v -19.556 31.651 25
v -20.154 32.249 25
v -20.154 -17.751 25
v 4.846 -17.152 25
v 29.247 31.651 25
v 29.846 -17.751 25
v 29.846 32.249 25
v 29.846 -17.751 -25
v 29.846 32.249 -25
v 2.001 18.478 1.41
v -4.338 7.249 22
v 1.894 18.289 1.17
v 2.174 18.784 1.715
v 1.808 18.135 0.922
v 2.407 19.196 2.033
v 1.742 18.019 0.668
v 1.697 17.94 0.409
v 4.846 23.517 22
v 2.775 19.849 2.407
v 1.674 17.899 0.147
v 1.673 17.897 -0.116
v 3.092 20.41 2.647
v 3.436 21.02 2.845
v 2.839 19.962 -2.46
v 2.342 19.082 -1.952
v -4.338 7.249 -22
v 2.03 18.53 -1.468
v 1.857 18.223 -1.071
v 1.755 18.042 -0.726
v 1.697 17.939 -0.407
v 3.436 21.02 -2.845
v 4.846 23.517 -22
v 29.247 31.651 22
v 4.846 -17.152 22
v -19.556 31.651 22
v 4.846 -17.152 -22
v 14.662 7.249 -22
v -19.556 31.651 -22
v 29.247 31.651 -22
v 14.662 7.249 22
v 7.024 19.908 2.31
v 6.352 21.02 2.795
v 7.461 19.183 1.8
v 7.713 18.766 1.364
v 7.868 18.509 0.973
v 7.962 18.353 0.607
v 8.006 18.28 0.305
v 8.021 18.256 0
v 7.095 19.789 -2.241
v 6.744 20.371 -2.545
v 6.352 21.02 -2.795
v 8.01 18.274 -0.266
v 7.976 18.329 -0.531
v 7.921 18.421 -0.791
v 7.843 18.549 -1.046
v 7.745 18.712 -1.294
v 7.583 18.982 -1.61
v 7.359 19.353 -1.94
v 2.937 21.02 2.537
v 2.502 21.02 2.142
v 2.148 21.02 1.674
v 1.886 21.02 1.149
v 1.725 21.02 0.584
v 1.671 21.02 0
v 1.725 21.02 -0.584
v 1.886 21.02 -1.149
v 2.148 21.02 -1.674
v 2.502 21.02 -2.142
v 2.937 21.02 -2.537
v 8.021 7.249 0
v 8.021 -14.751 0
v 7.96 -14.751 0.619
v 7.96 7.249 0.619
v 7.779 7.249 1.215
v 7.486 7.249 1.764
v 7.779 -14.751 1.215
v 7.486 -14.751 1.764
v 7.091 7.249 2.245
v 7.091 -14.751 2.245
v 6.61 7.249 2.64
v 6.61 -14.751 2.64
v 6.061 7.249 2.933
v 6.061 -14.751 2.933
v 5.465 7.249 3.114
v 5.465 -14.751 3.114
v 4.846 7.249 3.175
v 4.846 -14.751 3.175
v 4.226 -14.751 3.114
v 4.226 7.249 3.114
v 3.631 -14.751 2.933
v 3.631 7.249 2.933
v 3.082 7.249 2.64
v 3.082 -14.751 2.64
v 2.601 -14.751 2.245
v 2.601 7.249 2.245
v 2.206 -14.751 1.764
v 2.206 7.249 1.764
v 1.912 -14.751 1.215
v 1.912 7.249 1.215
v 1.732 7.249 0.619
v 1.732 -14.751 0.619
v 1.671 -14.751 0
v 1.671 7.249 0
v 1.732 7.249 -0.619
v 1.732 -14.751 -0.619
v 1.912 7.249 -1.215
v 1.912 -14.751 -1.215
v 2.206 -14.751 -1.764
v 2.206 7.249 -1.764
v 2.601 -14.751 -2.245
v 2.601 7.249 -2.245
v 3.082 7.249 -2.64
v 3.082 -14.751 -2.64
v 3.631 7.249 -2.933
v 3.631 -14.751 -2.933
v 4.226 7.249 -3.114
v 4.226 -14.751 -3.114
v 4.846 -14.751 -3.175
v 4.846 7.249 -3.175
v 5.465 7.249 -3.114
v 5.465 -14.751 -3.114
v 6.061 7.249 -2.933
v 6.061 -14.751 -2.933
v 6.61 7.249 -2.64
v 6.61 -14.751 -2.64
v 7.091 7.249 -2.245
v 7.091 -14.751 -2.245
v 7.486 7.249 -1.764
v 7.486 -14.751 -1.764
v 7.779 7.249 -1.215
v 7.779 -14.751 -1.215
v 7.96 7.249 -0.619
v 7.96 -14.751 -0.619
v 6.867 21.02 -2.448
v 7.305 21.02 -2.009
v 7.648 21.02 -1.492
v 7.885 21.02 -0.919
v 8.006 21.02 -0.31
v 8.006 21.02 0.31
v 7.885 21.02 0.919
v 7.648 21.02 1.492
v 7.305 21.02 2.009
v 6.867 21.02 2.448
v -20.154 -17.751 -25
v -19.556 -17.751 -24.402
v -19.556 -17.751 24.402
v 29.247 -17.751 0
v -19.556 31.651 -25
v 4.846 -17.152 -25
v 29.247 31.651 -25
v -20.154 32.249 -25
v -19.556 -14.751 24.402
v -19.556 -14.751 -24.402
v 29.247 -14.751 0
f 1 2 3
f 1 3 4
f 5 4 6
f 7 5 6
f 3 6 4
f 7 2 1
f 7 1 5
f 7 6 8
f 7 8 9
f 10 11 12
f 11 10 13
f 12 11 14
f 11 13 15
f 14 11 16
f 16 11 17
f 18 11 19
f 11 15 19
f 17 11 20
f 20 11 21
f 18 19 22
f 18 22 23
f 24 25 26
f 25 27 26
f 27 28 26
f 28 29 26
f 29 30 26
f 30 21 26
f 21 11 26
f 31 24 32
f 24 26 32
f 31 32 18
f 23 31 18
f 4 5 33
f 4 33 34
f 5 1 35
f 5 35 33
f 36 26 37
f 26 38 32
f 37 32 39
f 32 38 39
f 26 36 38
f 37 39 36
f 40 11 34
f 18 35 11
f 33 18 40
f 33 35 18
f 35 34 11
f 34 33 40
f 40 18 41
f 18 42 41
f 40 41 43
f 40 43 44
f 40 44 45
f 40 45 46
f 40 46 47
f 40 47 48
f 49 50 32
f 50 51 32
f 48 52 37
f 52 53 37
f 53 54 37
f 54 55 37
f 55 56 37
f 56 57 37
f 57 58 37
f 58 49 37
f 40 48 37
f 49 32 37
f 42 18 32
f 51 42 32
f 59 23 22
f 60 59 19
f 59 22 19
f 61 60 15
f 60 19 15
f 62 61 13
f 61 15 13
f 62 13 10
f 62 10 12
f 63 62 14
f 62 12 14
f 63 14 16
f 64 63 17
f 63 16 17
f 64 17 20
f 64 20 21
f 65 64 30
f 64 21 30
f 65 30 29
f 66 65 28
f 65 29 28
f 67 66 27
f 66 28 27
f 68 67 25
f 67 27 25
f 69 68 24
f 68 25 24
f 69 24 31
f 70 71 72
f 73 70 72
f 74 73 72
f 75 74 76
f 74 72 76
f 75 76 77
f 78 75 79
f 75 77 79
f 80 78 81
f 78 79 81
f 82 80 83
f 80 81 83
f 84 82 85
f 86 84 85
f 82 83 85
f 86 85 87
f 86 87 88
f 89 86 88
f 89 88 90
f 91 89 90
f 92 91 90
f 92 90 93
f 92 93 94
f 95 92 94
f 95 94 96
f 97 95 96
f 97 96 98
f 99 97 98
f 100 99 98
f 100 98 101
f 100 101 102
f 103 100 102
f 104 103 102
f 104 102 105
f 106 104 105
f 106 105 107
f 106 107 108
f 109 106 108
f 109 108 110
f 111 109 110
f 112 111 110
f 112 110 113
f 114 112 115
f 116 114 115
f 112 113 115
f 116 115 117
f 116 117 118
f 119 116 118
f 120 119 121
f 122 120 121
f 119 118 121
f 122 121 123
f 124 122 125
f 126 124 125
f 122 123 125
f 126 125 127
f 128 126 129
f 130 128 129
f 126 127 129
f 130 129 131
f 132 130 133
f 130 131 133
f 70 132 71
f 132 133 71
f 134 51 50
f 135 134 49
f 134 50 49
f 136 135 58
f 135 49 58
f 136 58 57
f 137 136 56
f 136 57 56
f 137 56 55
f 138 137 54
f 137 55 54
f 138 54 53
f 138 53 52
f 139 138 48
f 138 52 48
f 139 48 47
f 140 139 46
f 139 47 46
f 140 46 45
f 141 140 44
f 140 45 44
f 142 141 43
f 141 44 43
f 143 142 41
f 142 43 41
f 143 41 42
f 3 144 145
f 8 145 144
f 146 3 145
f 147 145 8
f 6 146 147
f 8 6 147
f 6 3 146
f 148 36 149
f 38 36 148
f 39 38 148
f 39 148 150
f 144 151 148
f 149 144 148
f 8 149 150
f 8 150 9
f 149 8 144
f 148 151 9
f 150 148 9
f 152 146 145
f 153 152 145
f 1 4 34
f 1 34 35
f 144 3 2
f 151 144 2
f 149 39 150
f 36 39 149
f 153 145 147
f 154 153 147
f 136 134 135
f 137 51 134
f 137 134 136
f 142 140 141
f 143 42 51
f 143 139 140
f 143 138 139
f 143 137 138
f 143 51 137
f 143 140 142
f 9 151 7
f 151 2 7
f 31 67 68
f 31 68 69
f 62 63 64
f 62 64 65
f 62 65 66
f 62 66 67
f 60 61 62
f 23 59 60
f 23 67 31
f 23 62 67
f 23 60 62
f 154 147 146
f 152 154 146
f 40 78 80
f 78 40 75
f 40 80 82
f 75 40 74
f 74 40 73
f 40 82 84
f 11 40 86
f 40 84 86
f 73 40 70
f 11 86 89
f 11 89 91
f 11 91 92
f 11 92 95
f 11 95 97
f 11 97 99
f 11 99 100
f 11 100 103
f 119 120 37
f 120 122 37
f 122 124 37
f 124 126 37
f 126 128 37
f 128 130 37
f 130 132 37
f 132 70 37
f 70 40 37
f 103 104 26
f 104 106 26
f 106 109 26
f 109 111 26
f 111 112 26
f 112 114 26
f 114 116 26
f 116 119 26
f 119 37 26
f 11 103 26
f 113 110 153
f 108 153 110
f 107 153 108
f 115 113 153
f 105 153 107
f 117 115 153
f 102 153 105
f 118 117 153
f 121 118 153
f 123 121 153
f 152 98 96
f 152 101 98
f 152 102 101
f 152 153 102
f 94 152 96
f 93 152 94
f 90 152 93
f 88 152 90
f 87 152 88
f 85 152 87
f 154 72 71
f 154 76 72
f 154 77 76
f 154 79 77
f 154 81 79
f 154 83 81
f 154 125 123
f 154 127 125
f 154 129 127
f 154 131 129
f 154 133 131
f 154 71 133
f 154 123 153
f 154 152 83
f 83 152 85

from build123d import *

# Parameters (mm, degrees)
F0_W     = 50
F0_H     = 50
F1_DEPTH = 25
F2_DEPTH = 22
F4_DEPTH = 48
F5_R     = 3.175
F6_DEPTH = 38.77081
F8_DEPTH = 3


with BuildPart() as f1:
    # F0 (on Top) → F1 (new body, symmetric)
    with BuildSketch(Plane.XY):
        with Locations((4.845758, 7.249413)):
            Rectangle(F0_W, F0_H)
        Polygon((4.845758, -17.152166), (-19.555818, 31.650989), (29.247334, 31.650989), align=None, mode=Mode.SUBTRACT)
    extrude(amount=F1_DEPTH, both=True)

    # F0 (on Top) → F2 (join, symmetric)
    with BuildSketch(Plane.XY):
        Polygon((29.247334, 31.650989), (-19.555818, 31.650989), (4.845758, -17.152166), align=None)
    extrude(amount=F2_DEPTH, both=True)

    # F3 (on face) → F4 (cut)
    with BuildSketch(Plane(origin=(0, 0, -22), x_dir=(1, 0, 0), z_dir=(0, 0, -1))):
        Polygon((-4.337861, -7.249412), (4.845758, -23.51713), (14.662139, -7.249412), align=None)
    extrude(amount=-F4_DEPTH, mode=Mode.SUBTRACT)

    # F5 (on face) → F6 (cut)
    with BuildSketch(Plane.XZ.offset(17.750587)):
        with Locations((4.845758, 0)):
            Circle(F5_R)
    extrude(amount=-F6_DEPTH, mode=Mode.SUBTRACT)

    # F7 (on face) → F8 (cut)
    with BuildSketch(Plane.XZ.offset(17.750587)):
        Polygon((29.247338, 0), (-19.555822, 24.40158), (-19.555822, -24.40158), align=None)
    extrude(amount=-F8_DEPTH, mode=Mode.SUBTRACT)


solid = f1.part
